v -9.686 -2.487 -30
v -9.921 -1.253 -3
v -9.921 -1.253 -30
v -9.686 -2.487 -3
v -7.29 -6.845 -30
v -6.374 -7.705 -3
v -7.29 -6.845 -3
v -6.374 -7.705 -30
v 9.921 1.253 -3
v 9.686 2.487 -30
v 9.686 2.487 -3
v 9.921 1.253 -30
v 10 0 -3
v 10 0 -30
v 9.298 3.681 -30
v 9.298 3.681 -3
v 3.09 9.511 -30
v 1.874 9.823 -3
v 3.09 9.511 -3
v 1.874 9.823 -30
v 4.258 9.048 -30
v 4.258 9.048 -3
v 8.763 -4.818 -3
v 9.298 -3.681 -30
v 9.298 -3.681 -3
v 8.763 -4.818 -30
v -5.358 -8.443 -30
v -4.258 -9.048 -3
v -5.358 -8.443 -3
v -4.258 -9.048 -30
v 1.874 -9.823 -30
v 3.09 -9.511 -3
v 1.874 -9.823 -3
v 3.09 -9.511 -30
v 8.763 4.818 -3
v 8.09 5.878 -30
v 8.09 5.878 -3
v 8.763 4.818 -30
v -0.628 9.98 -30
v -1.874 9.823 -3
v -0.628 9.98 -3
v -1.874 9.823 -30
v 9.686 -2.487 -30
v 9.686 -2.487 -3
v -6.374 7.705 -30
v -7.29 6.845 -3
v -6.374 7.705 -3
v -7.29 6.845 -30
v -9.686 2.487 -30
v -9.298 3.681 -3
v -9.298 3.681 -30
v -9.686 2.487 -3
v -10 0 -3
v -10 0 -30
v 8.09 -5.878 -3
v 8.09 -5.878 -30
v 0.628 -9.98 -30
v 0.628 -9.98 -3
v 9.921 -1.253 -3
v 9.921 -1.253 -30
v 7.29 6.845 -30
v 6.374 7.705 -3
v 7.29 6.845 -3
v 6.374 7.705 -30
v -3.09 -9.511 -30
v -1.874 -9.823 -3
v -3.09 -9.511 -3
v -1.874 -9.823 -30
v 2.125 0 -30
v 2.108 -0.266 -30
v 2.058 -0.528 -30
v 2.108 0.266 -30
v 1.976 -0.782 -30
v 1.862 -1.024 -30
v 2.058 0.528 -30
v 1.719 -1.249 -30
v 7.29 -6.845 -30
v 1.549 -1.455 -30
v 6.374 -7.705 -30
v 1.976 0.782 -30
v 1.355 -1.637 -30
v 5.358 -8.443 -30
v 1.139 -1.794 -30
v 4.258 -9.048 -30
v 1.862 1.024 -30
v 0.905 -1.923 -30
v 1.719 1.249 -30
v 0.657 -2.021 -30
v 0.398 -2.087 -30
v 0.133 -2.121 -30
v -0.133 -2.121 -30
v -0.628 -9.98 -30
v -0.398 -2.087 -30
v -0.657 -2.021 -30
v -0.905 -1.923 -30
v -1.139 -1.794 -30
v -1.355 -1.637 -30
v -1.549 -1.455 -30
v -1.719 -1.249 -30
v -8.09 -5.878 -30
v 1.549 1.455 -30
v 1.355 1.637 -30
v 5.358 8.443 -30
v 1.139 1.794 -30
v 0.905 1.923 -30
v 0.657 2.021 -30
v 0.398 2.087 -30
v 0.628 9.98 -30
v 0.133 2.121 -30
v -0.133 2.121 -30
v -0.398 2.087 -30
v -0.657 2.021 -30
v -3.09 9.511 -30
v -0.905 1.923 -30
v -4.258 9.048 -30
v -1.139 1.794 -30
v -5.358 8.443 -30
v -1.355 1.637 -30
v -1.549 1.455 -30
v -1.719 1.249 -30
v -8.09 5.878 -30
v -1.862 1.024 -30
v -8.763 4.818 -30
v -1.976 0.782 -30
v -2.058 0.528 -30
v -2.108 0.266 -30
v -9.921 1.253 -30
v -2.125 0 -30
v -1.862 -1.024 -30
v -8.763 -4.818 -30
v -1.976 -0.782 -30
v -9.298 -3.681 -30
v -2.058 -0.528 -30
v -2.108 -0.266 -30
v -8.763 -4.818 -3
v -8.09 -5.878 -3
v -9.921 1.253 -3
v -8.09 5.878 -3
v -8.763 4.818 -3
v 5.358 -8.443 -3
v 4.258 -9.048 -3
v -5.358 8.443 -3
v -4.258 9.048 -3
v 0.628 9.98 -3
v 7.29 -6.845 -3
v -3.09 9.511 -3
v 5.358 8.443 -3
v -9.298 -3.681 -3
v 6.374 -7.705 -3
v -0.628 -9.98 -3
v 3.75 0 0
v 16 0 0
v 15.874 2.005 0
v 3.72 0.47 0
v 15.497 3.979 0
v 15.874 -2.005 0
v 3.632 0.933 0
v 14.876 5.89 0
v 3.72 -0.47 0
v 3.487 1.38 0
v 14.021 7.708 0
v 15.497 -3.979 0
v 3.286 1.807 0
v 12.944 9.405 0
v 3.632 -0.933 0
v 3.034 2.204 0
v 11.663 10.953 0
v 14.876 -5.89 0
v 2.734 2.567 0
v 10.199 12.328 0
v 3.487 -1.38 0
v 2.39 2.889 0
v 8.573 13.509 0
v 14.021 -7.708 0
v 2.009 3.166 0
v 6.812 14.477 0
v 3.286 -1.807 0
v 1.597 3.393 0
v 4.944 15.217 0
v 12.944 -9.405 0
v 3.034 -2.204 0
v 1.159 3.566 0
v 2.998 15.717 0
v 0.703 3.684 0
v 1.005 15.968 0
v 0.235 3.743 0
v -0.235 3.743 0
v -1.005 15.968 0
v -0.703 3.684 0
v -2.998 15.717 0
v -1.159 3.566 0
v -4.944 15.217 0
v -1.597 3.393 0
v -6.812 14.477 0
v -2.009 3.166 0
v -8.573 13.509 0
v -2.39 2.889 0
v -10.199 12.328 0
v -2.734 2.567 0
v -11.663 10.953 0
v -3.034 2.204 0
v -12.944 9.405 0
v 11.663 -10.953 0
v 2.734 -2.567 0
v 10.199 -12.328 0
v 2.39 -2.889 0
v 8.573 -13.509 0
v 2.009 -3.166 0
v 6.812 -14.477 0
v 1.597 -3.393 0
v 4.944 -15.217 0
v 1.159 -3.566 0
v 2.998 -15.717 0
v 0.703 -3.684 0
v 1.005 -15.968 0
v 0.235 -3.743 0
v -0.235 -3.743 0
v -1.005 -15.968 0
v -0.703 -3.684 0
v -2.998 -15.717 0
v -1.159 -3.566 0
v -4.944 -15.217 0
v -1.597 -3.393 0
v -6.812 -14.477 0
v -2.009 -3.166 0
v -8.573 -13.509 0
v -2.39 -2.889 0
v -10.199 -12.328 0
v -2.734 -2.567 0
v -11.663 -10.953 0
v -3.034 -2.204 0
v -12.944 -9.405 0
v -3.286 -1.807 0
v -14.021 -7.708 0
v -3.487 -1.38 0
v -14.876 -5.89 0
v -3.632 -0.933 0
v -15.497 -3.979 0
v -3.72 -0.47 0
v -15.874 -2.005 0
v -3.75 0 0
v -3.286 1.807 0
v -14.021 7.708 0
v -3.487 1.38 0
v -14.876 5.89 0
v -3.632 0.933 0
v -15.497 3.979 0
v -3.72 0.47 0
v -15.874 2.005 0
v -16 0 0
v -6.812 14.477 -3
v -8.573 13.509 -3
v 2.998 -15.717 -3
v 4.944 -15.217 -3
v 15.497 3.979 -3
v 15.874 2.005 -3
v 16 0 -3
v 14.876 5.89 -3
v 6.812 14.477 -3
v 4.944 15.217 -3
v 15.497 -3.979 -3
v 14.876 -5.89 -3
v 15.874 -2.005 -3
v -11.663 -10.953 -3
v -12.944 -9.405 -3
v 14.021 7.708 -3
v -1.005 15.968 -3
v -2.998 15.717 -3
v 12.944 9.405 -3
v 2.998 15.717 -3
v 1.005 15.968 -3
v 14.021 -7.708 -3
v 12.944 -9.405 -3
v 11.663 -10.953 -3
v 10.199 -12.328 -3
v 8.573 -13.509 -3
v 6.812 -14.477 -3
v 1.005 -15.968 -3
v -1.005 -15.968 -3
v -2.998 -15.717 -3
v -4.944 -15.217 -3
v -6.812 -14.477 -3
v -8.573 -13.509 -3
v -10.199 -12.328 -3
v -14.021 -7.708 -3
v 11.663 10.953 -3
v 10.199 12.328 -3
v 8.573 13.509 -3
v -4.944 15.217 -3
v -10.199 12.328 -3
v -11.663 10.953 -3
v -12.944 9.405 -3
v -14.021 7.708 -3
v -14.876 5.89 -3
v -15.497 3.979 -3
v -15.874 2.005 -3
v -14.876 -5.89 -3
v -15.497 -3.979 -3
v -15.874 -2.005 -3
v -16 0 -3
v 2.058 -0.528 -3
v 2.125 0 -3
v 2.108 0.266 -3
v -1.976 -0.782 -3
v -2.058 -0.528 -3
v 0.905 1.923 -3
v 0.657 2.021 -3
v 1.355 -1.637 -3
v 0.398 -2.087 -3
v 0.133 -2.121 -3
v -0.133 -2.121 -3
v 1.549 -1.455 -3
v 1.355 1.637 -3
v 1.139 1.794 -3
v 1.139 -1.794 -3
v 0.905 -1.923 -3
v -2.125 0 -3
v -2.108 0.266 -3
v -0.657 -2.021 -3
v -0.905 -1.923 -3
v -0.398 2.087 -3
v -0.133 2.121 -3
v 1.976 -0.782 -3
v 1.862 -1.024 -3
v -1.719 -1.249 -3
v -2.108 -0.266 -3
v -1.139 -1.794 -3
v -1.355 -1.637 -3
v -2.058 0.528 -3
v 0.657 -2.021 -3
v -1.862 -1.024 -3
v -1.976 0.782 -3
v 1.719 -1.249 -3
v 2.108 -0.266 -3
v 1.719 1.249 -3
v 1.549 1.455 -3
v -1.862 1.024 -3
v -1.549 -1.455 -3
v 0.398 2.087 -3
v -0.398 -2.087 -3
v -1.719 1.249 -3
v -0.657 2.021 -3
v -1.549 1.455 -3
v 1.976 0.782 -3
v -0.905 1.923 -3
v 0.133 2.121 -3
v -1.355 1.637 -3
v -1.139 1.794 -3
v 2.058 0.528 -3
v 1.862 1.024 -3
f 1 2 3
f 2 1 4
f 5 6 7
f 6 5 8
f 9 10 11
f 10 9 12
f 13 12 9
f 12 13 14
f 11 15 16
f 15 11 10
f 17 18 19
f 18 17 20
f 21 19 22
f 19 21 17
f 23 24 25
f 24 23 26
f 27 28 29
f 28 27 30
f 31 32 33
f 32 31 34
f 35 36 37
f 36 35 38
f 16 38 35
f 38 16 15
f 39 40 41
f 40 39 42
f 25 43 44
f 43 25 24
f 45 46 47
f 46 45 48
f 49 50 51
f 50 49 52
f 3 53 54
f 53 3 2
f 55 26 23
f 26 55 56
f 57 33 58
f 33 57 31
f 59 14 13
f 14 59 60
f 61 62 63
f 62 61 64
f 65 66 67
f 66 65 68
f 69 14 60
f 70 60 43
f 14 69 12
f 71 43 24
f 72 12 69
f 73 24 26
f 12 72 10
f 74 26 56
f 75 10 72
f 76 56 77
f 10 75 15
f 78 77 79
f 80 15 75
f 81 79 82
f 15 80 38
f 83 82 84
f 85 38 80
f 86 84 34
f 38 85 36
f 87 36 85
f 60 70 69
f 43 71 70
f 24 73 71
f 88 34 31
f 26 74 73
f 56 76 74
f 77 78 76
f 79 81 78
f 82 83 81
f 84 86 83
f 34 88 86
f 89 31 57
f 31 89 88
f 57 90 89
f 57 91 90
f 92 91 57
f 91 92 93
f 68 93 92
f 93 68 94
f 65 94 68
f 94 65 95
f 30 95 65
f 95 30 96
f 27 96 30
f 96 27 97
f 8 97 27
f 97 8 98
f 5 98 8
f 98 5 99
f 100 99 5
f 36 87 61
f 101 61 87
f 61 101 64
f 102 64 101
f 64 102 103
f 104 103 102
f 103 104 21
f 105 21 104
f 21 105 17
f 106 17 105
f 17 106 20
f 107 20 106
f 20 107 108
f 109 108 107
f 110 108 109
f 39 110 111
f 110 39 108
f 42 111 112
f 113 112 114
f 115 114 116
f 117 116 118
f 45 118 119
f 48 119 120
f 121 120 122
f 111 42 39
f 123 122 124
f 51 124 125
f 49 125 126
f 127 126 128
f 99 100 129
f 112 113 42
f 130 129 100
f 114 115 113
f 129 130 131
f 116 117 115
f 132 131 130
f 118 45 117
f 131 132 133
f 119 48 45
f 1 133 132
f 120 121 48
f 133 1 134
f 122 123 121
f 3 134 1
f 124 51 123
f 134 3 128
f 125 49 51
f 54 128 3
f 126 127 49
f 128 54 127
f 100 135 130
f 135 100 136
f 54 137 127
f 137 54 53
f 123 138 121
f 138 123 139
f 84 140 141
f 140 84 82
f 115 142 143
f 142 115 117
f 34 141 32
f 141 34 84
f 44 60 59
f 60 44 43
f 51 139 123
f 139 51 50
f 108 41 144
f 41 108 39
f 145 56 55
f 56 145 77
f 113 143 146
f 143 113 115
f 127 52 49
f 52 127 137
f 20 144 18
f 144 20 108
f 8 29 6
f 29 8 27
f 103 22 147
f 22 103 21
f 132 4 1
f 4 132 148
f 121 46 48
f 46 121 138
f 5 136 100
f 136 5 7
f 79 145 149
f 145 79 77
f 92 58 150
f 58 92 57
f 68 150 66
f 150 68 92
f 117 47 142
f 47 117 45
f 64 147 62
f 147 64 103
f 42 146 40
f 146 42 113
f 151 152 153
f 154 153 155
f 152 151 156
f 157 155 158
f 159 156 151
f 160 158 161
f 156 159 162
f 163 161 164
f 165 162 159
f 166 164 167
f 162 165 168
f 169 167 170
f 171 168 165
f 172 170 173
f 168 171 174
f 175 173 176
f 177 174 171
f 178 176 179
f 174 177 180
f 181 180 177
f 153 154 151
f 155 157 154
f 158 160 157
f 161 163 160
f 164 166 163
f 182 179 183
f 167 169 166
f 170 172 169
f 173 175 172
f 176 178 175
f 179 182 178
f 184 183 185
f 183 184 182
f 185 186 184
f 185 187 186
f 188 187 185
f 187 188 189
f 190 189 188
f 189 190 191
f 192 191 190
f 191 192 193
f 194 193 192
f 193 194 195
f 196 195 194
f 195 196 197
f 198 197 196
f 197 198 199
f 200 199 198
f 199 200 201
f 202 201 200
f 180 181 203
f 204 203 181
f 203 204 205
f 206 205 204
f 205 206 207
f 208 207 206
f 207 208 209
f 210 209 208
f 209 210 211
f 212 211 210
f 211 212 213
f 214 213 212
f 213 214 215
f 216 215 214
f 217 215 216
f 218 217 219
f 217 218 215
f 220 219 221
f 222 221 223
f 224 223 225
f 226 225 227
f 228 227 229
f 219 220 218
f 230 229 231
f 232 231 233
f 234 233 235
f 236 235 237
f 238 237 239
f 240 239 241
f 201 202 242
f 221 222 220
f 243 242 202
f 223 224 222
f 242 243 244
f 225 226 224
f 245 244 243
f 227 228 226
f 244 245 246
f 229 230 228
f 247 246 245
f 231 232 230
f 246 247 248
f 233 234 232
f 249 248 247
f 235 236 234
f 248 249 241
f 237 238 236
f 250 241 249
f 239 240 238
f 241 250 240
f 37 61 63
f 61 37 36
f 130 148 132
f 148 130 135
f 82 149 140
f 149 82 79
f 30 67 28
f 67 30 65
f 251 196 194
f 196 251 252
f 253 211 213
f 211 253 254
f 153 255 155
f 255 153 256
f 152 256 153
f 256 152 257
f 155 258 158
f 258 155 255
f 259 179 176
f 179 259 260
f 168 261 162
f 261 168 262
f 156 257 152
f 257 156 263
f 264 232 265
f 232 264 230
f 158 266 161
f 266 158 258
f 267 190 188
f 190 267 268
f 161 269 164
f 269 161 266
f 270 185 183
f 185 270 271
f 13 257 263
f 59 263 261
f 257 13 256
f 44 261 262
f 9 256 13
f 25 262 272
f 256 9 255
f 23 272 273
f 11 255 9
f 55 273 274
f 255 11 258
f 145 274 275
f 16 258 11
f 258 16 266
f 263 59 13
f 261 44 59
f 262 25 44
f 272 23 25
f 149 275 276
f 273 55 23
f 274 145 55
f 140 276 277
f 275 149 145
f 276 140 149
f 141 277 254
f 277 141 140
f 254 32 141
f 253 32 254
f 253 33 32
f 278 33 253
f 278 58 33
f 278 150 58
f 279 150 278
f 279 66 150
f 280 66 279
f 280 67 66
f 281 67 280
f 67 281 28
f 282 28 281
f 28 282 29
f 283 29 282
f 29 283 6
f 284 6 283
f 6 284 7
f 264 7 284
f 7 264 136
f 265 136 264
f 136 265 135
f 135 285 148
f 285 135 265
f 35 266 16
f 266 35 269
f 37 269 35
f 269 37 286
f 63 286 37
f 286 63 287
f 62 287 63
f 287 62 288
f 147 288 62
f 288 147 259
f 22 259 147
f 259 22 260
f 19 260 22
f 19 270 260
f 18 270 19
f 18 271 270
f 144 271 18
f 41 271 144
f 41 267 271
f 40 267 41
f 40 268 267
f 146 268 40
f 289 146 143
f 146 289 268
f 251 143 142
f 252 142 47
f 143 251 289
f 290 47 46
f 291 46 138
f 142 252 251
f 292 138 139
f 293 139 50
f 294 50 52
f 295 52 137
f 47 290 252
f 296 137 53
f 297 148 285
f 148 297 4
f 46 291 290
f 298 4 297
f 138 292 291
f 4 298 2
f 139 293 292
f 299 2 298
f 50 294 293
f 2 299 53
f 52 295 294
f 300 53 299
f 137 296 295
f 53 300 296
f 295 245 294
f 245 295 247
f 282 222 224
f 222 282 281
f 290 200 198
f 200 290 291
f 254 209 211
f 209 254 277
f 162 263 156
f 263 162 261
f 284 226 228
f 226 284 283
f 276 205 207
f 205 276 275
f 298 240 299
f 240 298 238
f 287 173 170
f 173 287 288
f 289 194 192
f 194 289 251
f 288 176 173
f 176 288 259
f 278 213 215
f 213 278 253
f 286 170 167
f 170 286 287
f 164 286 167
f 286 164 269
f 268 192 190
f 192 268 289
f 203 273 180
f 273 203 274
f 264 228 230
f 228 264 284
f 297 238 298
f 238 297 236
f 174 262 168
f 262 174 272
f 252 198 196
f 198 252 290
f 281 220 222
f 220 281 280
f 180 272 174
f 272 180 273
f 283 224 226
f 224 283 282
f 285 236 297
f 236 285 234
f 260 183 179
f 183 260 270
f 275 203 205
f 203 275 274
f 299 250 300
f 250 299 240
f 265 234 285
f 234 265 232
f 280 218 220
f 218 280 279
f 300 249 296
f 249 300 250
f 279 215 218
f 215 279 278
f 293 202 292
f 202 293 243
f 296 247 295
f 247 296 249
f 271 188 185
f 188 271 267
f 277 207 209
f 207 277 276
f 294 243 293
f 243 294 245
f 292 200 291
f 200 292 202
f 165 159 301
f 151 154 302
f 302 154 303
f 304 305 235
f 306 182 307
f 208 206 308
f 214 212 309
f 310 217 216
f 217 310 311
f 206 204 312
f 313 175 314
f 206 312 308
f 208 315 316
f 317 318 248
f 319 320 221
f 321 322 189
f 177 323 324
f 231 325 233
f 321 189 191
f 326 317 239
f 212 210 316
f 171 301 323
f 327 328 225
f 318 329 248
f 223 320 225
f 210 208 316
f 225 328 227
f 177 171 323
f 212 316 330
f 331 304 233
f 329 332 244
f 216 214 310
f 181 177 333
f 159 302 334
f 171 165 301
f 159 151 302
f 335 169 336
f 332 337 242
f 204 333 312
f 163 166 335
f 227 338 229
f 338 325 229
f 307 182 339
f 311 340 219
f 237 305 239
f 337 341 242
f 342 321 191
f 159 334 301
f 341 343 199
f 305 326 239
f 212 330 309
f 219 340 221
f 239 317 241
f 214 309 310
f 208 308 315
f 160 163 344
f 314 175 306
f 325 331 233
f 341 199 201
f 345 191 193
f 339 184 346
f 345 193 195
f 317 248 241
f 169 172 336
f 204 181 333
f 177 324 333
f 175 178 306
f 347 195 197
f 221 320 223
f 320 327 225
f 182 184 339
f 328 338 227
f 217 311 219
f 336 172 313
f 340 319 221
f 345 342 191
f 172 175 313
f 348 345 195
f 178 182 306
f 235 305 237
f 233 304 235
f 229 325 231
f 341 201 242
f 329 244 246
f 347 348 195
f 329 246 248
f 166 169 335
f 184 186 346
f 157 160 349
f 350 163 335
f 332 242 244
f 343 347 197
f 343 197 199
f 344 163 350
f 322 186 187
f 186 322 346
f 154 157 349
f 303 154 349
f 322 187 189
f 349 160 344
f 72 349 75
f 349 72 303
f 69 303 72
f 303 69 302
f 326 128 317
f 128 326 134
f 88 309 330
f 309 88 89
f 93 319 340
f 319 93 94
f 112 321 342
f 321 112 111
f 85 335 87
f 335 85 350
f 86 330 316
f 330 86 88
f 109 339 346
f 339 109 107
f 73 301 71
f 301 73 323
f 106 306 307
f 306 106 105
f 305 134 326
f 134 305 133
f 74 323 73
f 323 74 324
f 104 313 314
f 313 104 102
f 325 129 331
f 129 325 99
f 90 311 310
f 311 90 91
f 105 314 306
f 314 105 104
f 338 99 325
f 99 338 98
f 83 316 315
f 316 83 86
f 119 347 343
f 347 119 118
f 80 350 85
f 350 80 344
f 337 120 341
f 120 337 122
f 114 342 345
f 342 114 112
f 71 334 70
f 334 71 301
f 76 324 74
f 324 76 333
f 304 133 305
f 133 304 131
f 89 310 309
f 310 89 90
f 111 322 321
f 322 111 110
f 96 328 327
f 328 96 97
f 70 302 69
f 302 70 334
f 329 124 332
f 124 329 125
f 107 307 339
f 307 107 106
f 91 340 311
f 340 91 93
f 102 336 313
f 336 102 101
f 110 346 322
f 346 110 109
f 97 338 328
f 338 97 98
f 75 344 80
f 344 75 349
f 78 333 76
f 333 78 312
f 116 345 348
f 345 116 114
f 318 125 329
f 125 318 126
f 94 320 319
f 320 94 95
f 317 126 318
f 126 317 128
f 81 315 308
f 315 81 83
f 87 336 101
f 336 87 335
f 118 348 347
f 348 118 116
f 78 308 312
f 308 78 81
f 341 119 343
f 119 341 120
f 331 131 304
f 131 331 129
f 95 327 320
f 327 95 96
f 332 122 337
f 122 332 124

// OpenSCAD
$fn = 50;


difference() {
	union() {
		translate(v = [0, 0, -30.0000000000]) {
			cylinder(h = 30, r = 10.0000000000);
		}
		translate(v = [0, 0, -3.0000000000]) {
			cylinder(h = 3, r = 16.0000000000);
		}
	}
	union() {
		translate(v = [0, 0, 0]) {
			rotate(a = [0, 0, 0]) {
				difference() {
					union() {
						#translate(v = [0, 0, -30.0000000000]) {
							cylinder(h = 30, r = 2.0000000000);
						}
						#translate(v = [0, 0, -3]) {
							cylinder(h = 3, r1 = 2.1250000000, r2 = 3.7500000000);
						}
						#translate(v = [0, 0, -30.0000000000]) {
							cylinder(h = 30, r = 2.1250000000);
						}
						#translate(v = [0, 0, -30.0000000000]) {
							cylinder(h = 30, r = 2.0000000000);
						}
					}
					union();
				}
			}
		}
	}
}
